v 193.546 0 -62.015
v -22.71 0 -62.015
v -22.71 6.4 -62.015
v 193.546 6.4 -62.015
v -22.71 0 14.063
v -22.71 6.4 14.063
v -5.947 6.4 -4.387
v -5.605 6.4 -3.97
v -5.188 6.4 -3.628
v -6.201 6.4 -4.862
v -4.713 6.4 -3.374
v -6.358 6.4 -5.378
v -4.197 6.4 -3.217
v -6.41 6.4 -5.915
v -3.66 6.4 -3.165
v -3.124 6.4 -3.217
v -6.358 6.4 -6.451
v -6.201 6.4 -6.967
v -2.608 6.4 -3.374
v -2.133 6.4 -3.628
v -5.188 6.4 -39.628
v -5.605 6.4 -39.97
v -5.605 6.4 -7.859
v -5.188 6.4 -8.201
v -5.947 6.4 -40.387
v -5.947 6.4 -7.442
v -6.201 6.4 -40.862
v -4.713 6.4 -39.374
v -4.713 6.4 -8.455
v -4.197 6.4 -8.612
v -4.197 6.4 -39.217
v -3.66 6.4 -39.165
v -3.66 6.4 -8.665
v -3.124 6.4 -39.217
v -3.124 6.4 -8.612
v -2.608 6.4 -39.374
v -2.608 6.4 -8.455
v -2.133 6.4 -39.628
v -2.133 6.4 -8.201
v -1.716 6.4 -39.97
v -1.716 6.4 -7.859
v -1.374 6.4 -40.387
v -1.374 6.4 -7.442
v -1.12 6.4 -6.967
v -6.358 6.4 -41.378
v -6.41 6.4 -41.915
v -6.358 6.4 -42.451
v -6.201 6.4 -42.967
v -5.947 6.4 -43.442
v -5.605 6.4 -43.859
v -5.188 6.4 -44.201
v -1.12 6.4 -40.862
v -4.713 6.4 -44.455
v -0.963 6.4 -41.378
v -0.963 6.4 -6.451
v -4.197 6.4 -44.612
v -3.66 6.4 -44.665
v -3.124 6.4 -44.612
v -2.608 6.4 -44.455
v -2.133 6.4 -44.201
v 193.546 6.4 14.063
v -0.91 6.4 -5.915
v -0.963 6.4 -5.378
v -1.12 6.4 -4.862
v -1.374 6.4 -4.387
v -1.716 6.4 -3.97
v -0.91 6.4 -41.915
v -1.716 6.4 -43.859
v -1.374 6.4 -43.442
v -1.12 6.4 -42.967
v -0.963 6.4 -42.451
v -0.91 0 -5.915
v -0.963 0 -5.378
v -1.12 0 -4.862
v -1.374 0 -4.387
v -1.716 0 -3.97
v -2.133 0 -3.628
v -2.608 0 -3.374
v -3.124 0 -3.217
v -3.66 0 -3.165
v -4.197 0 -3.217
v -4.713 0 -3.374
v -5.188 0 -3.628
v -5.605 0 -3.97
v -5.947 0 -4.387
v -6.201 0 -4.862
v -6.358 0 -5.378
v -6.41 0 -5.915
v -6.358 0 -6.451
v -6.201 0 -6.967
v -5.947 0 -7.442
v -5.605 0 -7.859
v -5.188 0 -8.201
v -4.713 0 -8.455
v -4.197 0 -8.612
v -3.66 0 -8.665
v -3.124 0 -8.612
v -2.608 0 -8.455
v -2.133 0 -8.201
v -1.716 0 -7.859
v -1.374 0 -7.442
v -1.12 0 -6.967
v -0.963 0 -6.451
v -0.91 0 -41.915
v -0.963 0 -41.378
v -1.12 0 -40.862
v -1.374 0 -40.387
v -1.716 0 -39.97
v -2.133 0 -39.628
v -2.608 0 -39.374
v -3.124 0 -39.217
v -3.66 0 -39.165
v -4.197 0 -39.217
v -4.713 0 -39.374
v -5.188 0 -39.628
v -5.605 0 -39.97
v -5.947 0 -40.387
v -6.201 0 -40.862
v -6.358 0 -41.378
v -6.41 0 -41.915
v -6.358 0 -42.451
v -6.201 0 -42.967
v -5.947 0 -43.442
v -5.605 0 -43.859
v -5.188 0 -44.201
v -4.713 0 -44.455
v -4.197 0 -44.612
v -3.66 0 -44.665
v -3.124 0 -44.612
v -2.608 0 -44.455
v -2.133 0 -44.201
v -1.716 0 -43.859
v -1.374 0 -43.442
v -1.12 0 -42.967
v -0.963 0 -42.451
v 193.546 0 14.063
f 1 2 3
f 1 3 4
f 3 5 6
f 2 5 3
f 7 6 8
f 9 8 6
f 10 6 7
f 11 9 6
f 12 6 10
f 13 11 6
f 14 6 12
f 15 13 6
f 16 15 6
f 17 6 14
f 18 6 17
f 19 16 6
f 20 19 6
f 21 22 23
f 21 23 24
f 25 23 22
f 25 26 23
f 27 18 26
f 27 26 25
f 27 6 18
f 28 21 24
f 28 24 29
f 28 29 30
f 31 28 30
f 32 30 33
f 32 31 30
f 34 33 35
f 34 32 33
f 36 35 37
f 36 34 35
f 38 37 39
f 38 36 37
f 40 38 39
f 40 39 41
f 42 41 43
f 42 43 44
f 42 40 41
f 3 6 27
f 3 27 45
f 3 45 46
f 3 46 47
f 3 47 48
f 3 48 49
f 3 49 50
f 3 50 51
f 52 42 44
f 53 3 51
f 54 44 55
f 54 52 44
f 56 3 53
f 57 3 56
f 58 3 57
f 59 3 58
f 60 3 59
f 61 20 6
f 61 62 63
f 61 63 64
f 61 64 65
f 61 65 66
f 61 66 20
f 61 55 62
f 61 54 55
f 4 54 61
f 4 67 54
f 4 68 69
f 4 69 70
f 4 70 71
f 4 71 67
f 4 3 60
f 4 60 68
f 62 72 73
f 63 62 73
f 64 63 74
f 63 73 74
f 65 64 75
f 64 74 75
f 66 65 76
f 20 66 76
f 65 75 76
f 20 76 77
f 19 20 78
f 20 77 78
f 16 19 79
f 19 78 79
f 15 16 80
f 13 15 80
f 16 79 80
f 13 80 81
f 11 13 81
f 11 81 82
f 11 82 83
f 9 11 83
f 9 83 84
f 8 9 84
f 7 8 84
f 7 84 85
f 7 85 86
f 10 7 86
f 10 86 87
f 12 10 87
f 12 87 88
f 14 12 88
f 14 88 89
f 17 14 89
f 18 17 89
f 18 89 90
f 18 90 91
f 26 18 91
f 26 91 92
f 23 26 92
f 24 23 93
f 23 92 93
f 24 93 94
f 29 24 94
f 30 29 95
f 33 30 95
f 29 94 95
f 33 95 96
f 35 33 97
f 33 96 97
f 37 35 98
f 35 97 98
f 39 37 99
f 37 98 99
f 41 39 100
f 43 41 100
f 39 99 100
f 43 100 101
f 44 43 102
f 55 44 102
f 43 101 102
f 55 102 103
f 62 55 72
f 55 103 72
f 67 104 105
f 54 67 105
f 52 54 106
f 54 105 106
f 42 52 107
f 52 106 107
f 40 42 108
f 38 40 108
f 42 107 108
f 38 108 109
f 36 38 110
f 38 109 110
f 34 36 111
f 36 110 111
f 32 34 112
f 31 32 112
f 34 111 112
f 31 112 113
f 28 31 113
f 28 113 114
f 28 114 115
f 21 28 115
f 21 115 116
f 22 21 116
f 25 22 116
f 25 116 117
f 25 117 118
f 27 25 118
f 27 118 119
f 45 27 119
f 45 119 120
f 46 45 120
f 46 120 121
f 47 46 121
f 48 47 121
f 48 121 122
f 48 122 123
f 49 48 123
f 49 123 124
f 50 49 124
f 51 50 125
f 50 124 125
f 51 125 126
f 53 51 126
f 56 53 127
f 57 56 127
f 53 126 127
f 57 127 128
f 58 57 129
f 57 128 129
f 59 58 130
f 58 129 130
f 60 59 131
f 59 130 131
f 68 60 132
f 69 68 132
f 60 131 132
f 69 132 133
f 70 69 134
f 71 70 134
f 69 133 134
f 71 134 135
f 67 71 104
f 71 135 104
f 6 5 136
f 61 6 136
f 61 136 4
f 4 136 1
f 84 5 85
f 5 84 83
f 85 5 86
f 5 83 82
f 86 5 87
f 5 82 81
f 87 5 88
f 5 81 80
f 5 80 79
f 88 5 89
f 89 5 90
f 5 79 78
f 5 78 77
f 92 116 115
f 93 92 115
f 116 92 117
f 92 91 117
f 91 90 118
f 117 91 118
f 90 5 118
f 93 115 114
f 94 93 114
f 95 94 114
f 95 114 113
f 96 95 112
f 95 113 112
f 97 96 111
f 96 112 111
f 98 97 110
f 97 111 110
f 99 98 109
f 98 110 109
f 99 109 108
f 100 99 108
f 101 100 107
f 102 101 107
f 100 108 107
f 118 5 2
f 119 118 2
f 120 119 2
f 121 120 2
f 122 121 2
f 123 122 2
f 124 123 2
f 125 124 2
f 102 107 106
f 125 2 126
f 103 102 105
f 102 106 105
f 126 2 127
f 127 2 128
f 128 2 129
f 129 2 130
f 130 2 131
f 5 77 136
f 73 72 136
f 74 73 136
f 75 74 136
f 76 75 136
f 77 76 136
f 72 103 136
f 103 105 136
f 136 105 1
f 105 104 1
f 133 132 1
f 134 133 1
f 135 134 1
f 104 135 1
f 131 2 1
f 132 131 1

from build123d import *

# Parameters (mm, degrees)
SKETCH1_W           = 216.256477903
SKETCH1_H           = 76.077868368
BOSS_EXTRUDE1_DEPTH = 6.4
SKETCH2_R           = 2.75
CUT_EXTRUDE1_DEPTH  = 10


with BuildPart() as part:
    # Sketch1 → Boss-Extrude1 (new body)
    with BuildSketch(Plane(origin=(0, 0, 0), x_dir=(1, 0, 0), z_dir=(0, 1, 0))):
        with Locations((85.41776647, 23.975642843)):
            Rectangle(SKETCH1_W, SKETCH1_H)
    extrude(amount=BOSS_EXTRUDE1_DEPTH)

    # Sketch2 → Cut-Extrude1 (cut)
    with BuildSketch(Plane.XZ):
        with Locations((-3.660472482, -5.914577027)):
            Circle(SKETCH2_R)
        with Locations((-3.660472482, -41.914577027)):
            Circle(SKETCH2_R)
    extrude(amount=-CUT_EXTRUDE1_DEPTH, mode=Mode.SUBTRACT)


solid = part.part
